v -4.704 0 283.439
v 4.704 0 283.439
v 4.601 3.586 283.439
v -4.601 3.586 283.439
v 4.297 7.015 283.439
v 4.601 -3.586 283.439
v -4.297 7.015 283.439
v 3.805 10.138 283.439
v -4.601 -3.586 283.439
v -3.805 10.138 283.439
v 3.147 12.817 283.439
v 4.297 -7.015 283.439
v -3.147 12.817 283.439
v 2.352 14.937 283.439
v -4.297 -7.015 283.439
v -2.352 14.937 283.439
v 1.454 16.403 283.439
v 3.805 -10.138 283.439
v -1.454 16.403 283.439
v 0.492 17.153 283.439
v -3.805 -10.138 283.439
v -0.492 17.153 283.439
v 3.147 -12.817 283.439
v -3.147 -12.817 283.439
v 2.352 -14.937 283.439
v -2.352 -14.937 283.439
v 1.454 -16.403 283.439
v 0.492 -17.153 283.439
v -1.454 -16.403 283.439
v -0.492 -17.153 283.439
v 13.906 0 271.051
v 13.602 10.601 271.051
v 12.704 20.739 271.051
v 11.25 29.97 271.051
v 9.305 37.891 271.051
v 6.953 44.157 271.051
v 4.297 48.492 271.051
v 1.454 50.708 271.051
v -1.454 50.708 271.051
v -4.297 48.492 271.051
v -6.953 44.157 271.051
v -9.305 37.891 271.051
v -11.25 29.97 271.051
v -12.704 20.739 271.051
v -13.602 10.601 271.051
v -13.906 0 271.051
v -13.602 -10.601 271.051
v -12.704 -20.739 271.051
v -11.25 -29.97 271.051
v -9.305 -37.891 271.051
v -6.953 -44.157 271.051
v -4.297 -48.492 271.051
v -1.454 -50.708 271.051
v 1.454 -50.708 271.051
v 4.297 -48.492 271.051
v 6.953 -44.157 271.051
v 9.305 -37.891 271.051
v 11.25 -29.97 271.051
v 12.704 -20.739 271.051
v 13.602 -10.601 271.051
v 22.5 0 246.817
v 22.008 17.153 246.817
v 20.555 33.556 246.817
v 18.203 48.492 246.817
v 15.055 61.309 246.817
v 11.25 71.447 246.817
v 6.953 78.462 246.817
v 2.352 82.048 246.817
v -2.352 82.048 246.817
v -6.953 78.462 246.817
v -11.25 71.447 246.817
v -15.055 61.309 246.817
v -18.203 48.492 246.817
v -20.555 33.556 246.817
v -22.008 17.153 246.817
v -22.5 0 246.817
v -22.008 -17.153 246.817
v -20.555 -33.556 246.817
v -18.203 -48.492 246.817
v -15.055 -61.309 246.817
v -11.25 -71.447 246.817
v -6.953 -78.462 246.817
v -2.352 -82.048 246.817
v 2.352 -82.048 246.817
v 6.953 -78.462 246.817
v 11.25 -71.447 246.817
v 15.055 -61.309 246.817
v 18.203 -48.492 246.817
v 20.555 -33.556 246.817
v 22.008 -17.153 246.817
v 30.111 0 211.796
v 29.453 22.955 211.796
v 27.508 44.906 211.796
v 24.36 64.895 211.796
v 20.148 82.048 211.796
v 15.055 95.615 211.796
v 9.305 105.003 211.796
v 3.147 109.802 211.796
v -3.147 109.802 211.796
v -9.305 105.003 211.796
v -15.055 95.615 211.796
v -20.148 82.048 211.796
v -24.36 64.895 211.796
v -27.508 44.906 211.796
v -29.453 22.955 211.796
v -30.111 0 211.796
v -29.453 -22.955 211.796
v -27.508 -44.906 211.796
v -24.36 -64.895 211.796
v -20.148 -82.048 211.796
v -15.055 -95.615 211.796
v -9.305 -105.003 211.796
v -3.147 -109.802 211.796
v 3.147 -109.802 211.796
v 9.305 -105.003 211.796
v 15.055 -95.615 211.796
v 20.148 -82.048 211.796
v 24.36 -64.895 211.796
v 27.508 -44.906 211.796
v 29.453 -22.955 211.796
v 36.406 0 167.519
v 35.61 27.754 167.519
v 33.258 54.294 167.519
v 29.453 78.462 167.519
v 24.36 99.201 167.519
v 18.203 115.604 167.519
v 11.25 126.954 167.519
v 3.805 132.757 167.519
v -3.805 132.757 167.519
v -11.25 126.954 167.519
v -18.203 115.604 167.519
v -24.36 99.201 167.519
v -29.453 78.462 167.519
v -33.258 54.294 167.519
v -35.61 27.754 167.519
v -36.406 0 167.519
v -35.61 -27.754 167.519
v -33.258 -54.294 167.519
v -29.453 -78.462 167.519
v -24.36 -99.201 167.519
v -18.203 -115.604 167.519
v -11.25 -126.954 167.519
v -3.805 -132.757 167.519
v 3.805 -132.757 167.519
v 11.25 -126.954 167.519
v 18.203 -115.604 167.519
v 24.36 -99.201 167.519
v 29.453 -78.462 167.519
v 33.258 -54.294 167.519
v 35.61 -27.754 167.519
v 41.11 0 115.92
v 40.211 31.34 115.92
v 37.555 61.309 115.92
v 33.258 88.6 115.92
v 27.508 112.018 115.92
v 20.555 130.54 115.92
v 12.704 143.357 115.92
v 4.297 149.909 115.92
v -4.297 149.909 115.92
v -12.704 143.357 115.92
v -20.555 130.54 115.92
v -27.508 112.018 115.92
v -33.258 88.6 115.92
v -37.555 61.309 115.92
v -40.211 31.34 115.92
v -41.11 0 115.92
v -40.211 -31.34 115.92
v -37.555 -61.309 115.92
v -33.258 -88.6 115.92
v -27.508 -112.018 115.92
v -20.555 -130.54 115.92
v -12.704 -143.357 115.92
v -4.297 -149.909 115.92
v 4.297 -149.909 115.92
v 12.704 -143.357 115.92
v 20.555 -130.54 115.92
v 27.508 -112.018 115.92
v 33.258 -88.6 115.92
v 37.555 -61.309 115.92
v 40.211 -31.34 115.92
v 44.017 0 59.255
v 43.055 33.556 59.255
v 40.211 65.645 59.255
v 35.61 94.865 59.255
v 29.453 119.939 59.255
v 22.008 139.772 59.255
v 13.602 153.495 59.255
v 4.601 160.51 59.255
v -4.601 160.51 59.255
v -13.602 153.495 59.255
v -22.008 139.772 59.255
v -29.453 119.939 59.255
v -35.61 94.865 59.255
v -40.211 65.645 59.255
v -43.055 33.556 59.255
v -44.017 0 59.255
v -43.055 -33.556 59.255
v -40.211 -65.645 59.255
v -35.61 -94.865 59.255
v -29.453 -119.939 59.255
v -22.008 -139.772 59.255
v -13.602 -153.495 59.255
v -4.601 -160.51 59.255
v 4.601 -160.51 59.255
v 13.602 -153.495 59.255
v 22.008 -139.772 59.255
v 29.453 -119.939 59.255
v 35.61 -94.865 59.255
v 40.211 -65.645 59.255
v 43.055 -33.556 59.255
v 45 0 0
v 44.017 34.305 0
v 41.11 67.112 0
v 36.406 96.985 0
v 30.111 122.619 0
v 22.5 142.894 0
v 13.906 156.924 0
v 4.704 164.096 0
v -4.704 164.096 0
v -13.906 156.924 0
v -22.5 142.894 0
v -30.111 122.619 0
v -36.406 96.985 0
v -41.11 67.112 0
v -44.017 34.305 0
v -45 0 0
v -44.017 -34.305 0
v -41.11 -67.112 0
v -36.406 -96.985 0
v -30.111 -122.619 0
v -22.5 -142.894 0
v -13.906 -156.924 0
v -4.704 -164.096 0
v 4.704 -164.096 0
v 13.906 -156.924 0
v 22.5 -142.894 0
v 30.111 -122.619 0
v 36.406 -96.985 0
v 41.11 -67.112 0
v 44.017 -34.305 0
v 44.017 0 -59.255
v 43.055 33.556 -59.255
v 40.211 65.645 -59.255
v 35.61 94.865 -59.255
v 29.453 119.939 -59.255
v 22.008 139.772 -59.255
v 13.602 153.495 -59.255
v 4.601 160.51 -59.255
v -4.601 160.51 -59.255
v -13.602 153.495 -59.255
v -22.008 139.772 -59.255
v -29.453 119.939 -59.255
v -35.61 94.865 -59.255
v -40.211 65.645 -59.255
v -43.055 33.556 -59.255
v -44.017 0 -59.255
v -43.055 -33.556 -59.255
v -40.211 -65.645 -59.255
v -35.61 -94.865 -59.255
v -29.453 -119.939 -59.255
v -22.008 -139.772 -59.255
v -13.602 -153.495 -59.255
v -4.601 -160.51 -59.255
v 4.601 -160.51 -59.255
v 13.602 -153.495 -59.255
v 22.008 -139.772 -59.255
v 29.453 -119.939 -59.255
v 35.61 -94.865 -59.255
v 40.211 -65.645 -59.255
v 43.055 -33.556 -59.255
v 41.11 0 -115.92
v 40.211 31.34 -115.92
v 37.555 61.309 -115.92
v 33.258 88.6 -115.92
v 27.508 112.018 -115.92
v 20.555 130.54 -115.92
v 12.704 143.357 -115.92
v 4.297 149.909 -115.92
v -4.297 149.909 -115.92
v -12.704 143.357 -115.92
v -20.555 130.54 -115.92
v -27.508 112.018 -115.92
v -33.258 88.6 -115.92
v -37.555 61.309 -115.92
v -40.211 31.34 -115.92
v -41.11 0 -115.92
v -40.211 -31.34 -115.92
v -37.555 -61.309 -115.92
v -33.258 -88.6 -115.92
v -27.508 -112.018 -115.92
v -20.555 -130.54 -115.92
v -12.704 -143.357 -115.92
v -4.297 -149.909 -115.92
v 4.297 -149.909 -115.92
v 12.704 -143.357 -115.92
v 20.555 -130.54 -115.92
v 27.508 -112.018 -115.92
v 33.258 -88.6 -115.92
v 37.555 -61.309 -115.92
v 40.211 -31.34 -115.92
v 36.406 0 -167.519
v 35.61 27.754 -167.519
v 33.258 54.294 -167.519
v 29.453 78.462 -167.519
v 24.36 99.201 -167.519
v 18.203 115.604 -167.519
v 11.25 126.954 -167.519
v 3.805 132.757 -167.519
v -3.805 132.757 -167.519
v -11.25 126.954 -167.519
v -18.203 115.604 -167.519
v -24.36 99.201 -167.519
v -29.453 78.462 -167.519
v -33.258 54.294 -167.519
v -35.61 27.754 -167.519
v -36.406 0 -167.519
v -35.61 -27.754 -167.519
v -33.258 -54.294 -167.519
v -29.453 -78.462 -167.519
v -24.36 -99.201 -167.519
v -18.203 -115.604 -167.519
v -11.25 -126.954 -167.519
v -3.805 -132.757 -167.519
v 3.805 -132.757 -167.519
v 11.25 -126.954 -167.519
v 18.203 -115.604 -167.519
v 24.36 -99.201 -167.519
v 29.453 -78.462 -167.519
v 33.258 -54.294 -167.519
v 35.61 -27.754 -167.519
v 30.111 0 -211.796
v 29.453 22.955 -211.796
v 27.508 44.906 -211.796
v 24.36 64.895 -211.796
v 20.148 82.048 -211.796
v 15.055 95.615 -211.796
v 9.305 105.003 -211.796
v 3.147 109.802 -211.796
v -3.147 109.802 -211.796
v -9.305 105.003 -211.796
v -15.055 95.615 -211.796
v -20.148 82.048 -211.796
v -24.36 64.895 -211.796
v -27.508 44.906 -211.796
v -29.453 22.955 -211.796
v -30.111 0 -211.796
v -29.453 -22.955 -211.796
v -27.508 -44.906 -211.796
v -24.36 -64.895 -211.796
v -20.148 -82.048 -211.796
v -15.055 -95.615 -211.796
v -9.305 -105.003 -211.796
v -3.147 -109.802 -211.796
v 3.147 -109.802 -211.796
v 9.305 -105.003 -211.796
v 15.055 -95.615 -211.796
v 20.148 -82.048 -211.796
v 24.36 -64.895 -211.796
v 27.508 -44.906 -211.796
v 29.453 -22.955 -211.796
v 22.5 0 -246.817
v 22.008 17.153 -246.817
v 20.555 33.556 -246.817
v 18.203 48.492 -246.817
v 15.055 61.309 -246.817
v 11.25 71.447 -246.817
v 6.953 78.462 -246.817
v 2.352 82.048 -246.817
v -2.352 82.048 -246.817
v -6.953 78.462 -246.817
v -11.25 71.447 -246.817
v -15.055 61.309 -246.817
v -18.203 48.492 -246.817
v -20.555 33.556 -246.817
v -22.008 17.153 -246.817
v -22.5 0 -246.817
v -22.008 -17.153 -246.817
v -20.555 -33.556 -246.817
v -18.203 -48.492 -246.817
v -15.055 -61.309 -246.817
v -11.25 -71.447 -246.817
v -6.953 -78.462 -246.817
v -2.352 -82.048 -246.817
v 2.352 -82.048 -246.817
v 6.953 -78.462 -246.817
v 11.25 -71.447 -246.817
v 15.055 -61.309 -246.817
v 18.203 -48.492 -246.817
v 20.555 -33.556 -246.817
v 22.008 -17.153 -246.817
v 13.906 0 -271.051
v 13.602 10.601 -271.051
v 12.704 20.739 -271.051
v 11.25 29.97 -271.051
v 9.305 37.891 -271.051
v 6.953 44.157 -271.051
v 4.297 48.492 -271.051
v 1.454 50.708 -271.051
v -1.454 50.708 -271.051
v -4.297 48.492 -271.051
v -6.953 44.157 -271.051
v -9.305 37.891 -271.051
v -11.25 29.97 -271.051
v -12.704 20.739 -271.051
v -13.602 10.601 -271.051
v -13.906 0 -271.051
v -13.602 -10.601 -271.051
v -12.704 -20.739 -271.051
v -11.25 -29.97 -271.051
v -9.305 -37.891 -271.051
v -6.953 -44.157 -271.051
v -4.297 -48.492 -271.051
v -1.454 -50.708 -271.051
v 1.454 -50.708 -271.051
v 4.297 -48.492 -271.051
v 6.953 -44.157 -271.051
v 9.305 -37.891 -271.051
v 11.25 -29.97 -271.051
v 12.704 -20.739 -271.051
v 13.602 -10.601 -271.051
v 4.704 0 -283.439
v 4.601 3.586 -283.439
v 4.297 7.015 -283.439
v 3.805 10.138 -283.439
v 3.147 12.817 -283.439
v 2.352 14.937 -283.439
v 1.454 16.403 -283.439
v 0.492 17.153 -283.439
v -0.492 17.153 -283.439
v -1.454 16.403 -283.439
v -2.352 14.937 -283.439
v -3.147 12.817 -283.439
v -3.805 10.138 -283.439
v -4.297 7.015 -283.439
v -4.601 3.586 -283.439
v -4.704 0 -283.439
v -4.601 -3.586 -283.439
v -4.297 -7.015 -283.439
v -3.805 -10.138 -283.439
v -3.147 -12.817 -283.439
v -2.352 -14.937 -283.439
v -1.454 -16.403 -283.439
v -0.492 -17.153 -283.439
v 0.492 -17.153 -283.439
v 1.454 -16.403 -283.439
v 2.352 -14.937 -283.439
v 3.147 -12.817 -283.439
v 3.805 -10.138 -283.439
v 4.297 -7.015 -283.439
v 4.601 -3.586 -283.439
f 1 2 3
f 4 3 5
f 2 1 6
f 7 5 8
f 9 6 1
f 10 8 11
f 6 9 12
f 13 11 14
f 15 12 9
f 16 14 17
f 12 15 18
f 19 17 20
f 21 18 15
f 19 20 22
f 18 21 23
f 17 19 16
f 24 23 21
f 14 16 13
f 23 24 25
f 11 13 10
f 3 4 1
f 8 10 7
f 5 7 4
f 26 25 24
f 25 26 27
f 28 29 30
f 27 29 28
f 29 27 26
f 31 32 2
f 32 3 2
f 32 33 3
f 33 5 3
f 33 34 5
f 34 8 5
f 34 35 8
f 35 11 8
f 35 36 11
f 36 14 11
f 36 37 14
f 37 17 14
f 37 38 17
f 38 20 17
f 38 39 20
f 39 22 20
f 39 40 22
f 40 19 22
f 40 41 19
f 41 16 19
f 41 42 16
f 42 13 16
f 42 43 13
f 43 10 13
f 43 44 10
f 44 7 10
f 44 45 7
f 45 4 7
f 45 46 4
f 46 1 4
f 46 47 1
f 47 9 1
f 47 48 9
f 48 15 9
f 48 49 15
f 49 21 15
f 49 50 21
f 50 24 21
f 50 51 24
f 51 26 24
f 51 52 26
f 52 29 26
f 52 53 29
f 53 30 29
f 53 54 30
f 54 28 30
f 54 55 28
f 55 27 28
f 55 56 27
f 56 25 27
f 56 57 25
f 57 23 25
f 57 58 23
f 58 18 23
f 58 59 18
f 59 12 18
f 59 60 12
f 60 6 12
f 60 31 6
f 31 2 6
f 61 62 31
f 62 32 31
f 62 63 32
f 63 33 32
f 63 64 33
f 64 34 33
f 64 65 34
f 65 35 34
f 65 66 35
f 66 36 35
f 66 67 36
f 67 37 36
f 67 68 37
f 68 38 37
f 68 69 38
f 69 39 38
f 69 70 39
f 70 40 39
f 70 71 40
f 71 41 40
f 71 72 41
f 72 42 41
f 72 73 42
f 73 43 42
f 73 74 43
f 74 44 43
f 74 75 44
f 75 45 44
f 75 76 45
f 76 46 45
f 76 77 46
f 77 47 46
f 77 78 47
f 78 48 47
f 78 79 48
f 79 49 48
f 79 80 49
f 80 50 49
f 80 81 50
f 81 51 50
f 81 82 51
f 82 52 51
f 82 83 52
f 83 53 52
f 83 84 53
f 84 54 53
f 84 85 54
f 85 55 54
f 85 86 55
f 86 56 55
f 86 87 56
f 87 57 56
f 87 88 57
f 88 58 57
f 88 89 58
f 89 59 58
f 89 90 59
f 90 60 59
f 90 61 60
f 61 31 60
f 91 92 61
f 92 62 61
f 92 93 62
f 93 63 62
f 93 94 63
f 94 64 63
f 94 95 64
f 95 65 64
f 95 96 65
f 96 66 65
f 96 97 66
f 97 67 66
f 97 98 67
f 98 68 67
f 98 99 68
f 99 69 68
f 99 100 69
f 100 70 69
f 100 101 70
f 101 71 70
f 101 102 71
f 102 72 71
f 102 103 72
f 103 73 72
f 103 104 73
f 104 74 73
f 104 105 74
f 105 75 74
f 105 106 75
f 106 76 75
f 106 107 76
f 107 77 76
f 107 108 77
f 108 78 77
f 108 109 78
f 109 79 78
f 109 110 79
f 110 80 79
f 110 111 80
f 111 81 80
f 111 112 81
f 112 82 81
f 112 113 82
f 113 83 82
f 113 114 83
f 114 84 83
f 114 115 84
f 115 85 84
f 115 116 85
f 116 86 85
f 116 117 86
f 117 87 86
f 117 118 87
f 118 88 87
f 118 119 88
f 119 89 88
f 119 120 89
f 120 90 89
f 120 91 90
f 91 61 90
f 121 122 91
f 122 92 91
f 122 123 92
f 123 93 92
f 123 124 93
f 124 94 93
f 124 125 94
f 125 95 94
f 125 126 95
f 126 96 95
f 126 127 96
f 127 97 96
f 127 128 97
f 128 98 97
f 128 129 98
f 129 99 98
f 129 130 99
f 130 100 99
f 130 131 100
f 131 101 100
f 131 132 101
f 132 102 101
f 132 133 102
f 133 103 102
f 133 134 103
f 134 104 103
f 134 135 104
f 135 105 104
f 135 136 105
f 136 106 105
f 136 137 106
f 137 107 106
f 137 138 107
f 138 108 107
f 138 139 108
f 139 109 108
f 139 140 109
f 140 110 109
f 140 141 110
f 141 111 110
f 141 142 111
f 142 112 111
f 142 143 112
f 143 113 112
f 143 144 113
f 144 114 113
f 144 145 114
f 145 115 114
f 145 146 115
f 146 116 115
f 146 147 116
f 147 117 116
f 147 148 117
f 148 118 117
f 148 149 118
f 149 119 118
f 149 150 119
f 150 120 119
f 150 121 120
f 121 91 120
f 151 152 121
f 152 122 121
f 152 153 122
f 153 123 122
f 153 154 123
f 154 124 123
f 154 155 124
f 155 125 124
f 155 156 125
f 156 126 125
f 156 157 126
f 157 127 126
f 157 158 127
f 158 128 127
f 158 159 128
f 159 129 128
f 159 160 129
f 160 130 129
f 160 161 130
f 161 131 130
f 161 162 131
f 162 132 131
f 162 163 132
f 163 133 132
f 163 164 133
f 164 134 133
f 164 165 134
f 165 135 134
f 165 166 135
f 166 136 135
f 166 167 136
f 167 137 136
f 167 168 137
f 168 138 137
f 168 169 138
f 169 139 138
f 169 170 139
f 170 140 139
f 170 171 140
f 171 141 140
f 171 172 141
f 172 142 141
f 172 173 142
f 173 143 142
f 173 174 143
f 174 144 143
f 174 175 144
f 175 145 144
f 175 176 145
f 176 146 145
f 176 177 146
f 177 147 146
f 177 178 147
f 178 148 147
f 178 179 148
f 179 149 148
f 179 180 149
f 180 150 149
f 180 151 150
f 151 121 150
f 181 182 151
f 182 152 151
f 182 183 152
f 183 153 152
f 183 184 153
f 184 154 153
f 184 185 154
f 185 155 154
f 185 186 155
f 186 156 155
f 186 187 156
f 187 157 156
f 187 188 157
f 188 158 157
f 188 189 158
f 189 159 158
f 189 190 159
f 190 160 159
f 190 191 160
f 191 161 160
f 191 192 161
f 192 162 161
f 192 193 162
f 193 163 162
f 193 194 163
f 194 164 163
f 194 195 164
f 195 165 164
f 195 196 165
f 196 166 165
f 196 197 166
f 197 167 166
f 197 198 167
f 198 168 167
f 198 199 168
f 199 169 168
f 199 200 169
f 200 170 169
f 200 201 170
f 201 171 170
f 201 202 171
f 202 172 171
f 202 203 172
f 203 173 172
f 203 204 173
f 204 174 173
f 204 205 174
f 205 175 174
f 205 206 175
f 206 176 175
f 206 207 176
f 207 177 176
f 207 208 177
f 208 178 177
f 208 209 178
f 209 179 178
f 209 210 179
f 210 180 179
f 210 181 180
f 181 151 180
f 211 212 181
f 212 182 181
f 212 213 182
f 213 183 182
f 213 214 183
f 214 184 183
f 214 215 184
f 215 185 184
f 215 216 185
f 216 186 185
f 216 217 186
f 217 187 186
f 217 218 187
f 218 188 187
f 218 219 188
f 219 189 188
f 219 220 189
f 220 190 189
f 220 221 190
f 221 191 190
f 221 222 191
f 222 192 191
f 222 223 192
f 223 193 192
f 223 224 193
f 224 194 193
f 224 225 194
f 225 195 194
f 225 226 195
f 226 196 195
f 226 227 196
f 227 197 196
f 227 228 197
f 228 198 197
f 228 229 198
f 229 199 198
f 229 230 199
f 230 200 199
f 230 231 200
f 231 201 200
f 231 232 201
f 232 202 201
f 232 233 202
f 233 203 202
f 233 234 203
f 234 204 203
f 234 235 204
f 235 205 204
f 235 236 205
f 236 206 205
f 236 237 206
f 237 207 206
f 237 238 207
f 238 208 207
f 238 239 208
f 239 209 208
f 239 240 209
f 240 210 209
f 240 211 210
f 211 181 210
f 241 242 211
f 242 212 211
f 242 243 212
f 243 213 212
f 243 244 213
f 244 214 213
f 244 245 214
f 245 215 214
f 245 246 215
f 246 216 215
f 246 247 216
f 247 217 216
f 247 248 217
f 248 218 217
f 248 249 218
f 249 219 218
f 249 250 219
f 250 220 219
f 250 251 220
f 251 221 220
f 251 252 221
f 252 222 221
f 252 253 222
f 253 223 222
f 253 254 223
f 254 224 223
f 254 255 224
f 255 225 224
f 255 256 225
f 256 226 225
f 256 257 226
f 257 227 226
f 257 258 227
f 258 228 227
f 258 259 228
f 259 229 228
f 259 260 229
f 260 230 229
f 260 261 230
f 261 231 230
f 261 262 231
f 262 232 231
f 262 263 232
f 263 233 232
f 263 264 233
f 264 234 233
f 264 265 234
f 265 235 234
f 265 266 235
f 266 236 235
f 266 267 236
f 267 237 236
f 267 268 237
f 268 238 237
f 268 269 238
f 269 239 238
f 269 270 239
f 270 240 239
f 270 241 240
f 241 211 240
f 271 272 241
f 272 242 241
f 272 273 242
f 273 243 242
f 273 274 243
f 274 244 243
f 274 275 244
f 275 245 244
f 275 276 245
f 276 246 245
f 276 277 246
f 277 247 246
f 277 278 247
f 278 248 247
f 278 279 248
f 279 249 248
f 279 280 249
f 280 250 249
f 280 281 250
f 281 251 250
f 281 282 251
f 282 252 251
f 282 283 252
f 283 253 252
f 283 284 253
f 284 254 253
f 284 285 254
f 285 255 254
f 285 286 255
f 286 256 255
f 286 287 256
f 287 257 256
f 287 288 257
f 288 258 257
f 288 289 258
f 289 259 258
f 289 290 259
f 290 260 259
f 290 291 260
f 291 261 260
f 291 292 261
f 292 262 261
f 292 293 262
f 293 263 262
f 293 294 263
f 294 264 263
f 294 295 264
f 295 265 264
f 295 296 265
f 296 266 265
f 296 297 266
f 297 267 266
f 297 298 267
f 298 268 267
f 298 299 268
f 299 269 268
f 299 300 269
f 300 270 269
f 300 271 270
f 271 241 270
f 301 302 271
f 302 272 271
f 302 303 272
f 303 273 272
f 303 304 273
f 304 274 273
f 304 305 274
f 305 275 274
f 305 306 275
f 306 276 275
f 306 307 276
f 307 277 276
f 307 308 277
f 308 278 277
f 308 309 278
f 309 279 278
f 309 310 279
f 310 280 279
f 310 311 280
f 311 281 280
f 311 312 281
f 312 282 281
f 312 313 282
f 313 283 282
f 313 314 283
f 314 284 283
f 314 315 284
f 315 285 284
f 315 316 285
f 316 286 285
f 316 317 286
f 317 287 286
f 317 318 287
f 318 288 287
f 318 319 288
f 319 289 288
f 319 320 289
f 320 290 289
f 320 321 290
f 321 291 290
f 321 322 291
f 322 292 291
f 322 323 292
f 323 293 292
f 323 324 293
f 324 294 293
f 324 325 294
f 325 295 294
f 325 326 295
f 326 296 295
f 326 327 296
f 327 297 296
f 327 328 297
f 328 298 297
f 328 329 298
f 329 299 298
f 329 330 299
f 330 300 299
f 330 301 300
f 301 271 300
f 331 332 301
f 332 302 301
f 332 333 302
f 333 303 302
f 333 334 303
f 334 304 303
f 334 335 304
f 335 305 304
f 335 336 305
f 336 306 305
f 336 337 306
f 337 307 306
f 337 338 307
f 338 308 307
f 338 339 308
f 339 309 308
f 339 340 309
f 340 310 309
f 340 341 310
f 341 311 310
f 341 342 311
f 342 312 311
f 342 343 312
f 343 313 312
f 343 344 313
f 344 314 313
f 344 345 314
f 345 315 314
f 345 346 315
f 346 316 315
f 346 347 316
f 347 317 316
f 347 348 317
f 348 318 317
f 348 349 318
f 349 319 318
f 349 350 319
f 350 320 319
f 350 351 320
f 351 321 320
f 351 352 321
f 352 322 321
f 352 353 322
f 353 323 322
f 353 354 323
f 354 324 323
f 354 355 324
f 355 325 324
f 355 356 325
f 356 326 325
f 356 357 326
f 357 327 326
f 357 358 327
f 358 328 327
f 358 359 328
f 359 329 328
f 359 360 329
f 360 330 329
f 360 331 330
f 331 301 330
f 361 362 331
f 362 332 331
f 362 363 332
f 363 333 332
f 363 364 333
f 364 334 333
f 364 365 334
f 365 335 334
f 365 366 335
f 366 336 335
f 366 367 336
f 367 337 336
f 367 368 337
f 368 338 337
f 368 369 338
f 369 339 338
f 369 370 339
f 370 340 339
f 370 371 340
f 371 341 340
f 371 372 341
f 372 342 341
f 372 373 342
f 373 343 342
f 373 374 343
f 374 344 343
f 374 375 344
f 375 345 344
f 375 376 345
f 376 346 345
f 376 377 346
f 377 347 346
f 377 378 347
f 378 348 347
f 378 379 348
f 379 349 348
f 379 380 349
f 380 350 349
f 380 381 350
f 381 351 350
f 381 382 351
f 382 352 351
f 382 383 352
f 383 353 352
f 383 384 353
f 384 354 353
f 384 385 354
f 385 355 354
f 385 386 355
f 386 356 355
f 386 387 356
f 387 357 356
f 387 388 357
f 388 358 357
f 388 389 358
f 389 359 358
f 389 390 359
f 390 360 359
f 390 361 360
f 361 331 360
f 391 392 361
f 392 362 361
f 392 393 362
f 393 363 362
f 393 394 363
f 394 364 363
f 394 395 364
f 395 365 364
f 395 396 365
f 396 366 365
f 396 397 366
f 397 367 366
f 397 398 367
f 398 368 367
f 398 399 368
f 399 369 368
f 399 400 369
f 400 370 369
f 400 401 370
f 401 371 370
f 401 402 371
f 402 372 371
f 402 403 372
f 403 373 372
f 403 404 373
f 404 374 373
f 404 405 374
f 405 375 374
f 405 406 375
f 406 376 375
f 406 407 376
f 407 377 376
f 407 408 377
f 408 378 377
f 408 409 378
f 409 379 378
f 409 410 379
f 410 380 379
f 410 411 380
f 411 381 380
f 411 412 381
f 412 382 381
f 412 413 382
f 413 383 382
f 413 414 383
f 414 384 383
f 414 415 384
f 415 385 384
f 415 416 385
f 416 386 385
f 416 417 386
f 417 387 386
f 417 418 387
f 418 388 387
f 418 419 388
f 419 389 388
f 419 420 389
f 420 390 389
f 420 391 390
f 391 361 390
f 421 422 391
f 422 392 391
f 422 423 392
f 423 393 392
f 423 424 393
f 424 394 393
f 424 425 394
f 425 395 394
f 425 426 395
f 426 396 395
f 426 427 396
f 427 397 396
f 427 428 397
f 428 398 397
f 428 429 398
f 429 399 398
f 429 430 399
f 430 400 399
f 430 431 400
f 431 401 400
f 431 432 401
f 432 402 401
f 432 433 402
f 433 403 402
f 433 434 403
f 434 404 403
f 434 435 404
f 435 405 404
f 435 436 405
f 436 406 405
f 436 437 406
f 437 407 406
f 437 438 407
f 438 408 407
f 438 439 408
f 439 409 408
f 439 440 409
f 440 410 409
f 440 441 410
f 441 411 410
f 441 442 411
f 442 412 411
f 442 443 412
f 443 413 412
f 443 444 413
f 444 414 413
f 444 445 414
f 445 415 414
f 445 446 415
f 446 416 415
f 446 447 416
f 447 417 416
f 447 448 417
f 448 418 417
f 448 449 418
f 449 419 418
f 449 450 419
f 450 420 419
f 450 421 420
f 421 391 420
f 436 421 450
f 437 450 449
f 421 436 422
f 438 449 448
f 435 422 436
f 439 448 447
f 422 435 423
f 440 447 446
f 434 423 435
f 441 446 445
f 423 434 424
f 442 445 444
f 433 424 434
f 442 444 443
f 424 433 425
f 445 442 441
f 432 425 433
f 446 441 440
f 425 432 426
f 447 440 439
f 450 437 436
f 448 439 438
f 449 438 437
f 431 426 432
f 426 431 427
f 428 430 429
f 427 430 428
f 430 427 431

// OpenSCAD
// Generated by SolidPython 1.0.1 on 2020-07-29 00:46:45


scale(v = [3, 11, 19]) {
	sphere(r = 15);
}
/***********************************************
*********      SolidPython code:      **********
************************************************
 
# import packages: SolidPython
from solid import *
from solid.utils import *
from itertools import chain, combinations, permutations


class Resize:

    def __init__(self, scad_file):
        self.scad_file = scad_file
        #self.scad_file = import_scad(scad_file)
        # cone/cylinder param:
        self.r1 = 0
        self.r2 = 0
        self.h = 0
        # rectangular prism param:
        self.w = 0
        self.l = 0
        # ellipse param:
        self.r = 0

    # import OpenScad code (file name corresponds to shape)


    # classify shape + parameters
    def assign(self, param1, param2, param3):
        if self.scad_file == 'cone.scad':
            self.r1 = param1
            self.r2 = param2
            self.h = param3
        elif self.scad_file == 'cylinder.scad':
            self.r1 = param1
            self.r2 = param2
            self.h = param3
        elif self.scad_file == 'rectangularPrism.scad':
            self.h = param1
            self.l = param2
            self.w = param3
        else:
            self.r = param1
            self.h = param2

    # resize parameters
    def iterate(self):
        x = range(3, 20, 2)
        i = 1
        if self.scad_file == 'cone.scad':
            tempList = list(permutations(x, 2))
            for temp in tempList:
                param1 = temp[0]
                param2 = temp[1]
                filepath = 'produced_scad_files/' + 'cone' + str(param1) + '_' + str(param2) + '_' + '.scad'
                scad_render_to_file(cylinder(h=param1, r1=param2, r2=0), filepath)

        elif self.scad_file == 'cylinder.scad':
            tempList = list(permutations(x, 3))
            for temp in tempList:
                param1 = temp[0]
                param2 = temp[1]
                filepath = 'produced_scad_files/' + 'cylinder' + str(param1) + '_' + str(param2) + '_' + '.scad'
                scad_render_to_file(cylinder(h=param1, r1=param2, r2=param2), filepath)

        elif self.scad_file == 'rectangularPrism.scad':
            tempList = list(permutations(x, 3))
            for temp in tempList:
                param1 = temp[0]
                param2 = temp[1]
                param3 = temp[2]
                filepath = 'produced_scad_files/' + 'rectangularPrism' + str(param1) + '_' + str(param2) + '_' + str(
                    param3) + '.scad'
                scad_render_to_file(cube(size=(param1, param2, param3)), filepath)

        elif self.scad_file == 'ellipse.scad':
            tempList = list(permutations(x, 4))
            for temp in tempList:
                param1 = temp[0]
                param2 = temp[1]
                param3 = temp[2]
                param4 = temp[3]
                filepath = 'produced_scad_files/' + 'ellipse' + str(param1) + '_' + str(param2) + '_' + str(param3) + '_' + str(param4) + '.scad'
                scad_render_to_file(scale([param1, param2, param3])(sphere(r=param4)), filepath)

    def render_to_scadfile(self):
        scad_render_to_file(scad, 'example.scad') 
 
************************************************/
